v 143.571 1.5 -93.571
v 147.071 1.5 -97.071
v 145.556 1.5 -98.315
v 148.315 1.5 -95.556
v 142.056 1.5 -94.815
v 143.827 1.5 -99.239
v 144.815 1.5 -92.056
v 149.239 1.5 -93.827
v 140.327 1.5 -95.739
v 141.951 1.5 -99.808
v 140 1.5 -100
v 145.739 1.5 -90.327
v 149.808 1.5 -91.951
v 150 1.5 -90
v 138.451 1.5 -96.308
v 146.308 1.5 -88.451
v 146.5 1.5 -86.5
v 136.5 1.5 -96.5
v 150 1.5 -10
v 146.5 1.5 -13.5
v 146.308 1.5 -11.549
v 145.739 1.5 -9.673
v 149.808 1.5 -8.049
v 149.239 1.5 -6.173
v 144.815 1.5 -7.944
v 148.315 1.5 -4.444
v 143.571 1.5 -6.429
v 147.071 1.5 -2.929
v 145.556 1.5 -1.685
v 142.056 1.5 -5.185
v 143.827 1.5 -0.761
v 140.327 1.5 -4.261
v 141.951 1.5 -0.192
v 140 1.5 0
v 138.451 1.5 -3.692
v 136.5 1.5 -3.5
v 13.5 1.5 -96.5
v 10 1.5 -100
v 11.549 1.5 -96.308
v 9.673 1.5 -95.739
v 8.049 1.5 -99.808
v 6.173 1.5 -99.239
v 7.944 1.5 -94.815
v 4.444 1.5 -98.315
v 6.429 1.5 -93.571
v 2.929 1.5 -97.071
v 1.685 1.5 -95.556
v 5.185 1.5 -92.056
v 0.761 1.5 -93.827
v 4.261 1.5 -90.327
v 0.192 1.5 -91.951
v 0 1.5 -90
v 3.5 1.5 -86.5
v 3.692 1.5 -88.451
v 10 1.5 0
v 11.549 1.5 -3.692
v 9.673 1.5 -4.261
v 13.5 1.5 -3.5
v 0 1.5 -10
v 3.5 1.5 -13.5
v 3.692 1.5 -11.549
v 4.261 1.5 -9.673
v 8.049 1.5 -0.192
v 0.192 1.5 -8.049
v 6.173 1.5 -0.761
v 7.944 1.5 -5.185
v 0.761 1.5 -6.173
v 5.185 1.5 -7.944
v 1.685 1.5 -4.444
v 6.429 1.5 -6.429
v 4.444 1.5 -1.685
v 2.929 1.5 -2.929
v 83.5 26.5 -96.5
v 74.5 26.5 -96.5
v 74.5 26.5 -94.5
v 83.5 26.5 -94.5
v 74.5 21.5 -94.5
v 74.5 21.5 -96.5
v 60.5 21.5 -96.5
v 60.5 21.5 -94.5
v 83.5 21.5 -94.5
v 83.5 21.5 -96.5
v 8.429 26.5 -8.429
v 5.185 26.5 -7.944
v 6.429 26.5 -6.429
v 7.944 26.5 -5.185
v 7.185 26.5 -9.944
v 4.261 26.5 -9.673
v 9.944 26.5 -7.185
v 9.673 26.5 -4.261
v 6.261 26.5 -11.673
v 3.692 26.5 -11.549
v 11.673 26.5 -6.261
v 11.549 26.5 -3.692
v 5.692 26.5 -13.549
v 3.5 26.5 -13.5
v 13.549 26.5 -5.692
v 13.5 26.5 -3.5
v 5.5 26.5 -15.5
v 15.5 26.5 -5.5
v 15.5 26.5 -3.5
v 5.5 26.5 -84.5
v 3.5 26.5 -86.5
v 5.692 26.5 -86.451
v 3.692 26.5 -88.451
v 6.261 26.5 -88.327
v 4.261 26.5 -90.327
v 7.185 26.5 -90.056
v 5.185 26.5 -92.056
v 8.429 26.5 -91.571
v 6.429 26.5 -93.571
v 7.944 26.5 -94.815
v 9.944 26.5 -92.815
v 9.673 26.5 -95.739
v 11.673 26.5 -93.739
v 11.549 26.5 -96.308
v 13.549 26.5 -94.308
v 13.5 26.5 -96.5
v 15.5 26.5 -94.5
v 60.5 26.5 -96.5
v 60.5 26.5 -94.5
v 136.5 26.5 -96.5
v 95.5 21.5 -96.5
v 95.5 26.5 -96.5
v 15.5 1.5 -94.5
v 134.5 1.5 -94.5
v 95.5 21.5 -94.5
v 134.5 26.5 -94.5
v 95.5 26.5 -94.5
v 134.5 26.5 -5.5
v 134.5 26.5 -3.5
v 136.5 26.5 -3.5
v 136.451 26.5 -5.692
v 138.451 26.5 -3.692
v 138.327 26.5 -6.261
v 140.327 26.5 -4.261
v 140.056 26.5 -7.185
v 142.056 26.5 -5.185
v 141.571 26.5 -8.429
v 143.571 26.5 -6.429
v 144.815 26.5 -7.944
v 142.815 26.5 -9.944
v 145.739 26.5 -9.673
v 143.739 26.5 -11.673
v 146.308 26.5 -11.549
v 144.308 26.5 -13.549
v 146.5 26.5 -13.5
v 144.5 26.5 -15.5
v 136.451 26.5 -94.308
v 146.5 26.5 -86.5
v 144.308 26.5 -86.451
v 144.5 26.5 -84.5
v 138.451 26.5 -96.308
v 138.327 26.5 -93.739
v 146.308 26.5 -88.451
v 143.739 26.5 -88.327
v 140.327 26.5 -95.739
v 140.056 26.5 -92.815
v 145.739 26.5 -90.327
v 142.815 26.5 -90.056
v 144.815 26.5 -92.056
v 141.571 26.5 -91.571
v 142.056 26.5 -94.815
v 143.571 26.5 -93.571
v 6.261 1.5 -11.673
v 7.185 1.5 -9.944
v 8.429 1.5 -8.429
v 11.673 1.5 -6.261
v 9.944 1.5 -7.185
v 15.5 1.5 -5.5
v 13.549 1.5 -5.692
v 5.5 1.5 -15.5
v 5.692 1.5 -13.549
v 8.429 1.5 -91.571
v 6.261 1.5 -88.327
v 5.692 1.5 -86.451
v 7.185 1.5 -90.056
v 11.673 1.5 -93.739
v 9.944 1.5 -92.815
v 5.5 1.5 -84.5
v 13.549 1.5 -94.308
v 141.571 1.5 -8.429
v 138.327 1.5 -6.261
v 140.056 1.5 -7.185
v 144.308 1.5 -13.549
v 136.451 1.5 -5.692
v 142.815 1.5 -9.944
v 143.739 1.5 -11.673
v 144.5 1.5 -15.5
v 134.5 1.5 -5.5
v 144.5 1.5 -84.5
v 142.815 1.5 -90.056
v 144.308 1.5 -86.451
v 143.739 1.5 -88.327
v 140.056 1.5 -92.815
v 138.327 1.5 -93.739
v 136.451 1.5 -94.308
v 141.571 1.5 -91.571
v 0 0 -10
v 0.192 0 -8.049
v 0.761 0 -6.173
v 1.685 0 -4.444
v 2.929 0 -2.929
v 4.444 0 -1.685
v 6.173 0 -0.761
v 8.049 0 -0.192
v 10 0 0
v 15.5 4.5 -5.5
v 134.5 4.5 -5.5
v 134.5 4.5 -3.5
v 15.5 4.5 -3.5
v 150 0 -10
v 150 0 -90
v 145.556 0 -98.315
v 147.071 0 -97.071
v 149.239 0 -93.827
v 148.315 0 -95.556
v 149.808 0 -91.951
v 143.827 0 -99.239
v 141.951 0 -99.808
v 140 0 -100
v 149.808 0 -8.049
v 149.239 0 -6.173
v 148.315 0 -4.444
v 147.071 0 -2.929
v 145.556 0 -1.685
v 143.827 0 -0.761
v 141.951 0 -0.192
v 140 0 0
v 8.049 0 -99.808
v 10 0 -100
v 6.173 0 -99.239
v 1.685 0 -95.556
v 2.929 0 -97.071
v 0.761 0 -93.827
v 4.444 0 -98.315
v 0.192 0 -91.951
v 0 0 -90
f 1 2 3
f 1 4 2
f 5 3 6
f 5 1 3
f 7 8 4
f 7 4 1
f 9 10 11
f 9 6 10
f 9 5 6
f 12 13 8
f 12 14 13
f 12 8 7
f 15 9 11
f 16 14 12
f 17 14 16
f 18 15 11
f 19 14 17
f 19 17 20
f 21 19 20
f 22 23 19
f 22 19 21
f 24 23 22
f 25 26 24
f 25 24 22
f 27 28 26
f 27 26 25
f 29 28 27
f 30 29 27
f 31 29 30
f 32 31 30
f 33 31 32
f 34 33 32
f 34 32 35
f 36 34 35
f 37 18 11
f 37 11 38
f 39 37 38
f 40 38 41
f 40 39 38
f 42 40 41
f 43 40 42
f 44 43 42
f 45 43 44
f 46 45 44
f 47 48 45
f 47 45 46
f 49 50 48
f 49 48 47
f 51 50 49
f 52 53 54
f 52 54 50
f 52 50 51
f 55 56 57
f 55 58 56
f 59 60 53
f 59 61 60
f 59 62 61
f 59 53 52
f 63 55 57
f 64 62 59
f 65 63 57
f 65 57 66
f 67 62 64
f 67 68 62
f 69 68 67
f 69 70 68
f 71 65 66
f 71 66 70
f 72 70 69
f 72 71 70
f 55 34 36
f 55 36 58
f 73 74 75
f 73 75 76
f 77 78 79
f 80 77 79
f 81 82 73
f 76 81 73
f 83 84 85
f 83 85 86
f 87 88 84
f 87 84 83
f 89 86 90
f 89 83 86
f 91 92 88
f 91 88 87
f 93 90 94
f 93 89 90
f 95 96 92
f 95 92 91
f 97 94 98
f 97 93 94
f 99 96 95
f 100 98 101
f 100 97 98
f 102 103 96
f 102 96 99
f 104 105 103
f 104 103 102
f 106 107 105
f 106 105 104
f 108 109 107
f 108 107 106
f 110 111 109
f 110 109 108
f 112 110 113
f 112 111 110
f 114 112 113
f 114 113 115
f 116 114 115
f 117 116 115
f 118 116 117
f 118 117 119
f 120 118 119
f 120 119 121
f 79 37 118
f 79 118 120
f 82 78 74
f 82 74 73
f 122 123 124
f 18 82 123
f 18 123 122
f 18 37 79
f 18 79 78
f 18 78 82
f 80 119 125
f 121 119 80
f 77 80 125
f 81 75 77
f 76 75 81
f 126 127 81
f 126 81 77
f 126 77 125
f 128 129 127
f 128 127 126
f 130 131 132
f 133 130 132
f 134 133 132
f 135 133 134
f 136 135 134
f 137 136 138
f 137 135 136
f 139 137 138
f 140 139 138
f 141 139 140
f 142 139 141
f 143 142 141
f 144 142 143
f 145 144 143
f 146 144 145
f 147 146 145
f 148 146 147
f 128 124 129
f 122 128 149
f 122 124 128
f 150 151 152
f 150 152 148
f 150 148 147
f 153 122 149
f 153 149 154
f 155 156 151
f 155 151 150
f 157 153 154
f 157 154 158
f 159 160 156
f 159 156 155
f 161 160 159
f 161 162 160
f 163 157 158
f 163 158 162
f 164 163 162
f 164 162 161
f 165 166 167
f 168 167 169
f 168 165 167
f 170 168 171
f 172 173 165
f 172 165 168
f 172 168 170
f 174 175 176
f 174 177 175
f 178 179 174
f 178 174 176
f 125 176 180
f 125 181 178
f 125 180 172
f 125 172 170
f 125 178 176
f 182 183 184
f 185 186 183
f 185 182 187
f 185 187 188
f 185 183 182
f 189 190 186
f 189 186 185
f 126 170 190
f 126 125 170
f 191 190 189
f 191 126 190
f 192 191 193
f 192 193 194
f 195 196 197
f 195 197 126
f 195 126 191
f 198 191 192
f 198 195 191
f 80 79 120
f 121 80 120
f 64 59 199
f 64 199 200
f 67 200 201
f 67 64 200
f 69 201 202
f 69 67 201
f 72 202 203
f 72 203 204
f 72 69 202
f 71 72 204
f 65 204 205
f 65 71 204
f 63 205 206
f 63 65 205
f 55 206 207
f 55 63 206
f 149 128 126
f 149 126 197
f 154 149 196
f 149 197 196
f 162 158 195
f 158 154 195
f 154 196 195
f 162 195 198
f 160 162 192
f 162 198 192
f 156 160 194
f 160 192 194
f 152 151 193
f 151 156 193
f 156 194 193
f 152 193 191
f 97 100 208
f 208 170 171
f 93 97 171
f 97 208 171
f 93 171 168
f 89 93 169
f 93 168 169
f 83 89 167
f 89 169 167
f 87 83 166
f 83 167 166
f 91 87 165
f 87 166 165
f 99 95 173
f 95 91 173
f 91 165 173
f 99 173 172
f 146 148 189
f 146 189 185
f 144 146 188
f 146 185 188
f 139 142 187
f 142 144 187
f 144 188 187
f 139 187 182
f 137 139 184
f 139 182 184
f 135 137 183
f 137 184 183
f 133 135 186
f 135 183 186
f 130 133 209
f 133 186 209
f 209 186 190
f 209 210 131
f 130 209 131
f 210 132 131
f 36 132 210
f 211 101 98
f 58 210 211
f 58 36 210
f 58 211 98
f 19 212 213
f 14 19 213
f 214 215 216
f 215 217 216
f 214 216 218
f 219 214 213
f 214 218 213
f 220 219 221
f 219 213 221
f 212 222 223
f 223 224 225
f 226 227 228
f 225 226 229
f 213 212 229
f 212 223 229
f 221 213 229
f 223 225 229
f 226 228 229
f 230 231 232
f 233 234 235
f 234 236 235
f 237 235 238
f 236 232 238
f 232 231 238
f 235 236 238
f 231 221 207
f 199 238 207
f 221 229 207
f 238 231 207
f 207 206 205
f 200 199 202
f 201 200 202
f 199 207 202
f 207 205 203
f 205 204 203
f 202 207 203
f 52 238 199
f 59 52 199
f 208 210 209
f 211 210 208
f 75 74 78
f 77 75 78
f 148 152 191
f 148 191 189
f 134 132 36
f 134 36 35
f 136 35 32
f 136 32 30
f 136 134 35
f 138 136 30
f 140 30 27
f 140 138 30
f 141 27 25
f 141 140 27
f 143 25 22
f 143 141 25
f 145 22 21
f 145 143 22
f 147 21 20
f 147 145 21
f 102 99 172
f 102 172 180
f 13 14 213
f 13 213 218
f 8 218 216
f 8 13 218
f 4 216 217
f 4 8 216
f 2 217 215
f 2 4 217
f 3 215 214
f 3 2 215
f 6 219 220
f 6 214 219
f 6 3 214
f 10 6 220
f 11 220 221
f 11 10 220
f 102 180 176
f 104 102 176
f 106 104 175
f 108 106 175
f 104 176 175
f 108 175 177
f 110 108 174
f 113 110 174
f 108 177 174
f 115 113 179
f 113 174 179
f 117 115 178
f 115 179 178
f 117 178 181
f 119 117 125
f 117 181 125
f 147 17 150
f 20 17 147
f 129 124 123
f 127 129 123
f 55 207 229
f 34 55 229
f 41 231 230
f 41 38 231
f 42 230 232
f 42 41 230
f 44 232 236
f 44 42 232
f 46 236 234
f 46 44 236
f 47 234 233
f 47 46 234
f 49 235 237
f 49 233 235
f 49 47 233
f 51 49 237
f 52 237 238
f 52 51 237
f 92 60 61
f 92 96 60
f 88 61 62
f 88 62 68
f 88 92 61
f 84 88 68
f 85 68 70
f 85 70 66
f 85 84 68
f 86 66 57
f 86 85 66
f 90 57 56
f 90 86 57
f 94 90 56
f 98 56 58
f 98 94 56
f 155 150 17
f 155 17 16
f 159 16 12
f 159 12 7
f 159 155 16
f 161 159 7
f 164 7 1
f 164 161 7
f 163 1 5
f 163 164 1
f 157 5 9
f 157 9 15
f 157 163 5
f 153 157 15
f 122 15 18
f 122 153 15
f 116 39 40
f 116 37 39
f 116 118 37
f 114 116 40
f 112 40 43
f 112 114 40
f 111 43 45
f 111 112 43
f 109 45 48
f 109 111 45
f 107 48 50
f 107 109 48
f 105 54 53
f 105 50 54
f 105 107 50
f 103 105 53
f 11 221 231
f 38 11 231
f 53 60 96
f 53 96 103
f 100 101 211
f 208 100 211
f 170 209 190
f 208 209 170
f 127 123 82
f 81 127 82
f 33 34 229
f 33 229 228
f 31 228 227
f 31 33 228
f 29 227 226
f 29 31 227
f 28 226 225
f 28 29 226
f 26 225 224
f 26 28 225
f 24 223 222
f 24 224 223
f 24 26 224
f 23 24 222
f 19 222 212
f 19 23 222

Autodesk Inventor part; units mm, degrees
ref_plane "YZ Plane" through (0, 0, 0) normal (1, 0, 0) x (0, 1, 0)
ref_plane "XZ Plane" through (0, 0, 0) normal (0, 1, 0) x (-1, 0, 0)
ref_plane "XY Plane" through (0, 0, 0) normal (0, 0, 1) x (1, 0, 0)
sketch "Náčrt1" plane through (0, 0, 0) normal (0, 1, 0) x (-1, 0, 0)
  line L0 (0, 0) -> (-150, 0)
  line L1 (-150, 0) -> (-150, -100)
  line L2 (-150, -100) -> (0, -100)
  line L3 (0, -100) -> (0, 0)
  dimension "d0" = 150
  dimension "d1" = 100
extrude "Vysunutí1" add sketch "Náčrt1" along normal blind 1.5
fillet "Zaoblení1" radius 10 4 edges at (150, 0.75, -100) (150, 0.75, 0) (0, 0.75, 0) (0, 0.75, -100)
sketch "Náčrt3" plane through (0, 1.5, 0) normal (0, 1, 0) x (1, 0, 0)
  line L0 (3.5, 96.5) -> (146.5, 96.5)
  line L1 (146.5, 96.5) -> (146.5, 3.5)
  line L2 (146.5, 3.5) -> (3.5, 3.5)
  line L3 (3.5, 3.5) -> (3.5, 96.5)
  line L4 (0, 90) -> (0, 10) projected
  line L5 (10, 0) -> (140, 0) projected
  point P0 (0, 0)
  dimension "d11" = 3.5
  dimension "d12" = 3.5
  dimension "d13" = 93
  dimension "d14" = 143
extrude "Vysunutí3" add sketch "Náčrt3" along normal blind 25
sketch "Náčrt4" plane through (0, 26.5, 0) normal (0, 1, 0) x (1, 0, 0)
  line L0 (3.5, 96.5) -> (3.5, 3.5) projected
  line L1 (5.5, 94.5) -> (144.5, 94.5)
  line L2 (144.5, 94.5) -> (144.5, 5.5)
  line L3 (144.5, 5.5) -> (5.5, 5.5)
  line L4 (5.5, 5.5) -> (5.5, 94.5)
  line L5 (3.5, 3.5) -> (146.5, 3.5) projected
  point P0 (0, 0)
  point P1 (3.5, 13.5)
  point P2 (13.5, 3.5)
  point P3 (136.5, 3.5)
  dimension "d19" = 2
  dimension "d20" = 2
  dimension "d21" = 139
  dimension "d22" = 89
extrude "Vysunutí4" cut sketch "Náčrt4" against normal blind 25
fillet "Zaoblení3" radius 10 8 edges at (144.5, 14, -94.5) (5.5, 14, -94.5) (5.5, 14, -5.5) (144.5, 14, -5.5) (3.5, 14, -96.5) (3.5, 14, -3.5) (146.5, 14, -96.5) (146.5, 14, -3.5)
sketch "Náčrt5" plane through (13.5, 1.5, -3.5) normal (0, 0, 1) x (1, 0, 0)
  line L0 (121, 25) -> (2, 25) projected
  line L1 (133, 0) -> (133, 25) projected
  line L2 (-10, 25) -> (-10, 0) projected
  line L3 (121, 0) -> (121, 25) projected
  line L4 (2, 25) -> (2, 0) projected
  line L5 (121, 3) -> (2, 3)
  line L6 (2, 3) -> (2, 25)
  line L7 (2, 25) -> (121, 25)
  line L8 (121, 25) -> (121, 3)
  point P0 (-13.5, -1.5)
extrude "Vysunutí5" cut sketch "Náčrt5" against normal blind 2
sketch "Náčrt6" plane through (136.5, 1.5, -96.5) normal (0, 0, -1) x (-1, 0, 0)
  line L0 (121, 25) -> (2, 25) projected
  line L1 (76, 25) -> (62, 25)
  line L2 (62, 25) -> (62, 20)
  line L3 (62, 20) -> (76, 20)
  line L4 (76, 20) -> (76, 25)
  line L5 (53, 25) -> (41, 25)
  line L6 (41, 25) -> (41, 20)
  line L7 (41, 20) -> (53, 20)
  line L8 (53, 20) -> (53, 25)
  line L9 (123, 25) -> (123, 0) projected
  line L10 (0, 0) -> (0, 25) projected
  point P0 (136.5, -1.5)
  point P1 (41, 25)
  dimension "d30" = 47
  dimension "d31" = 61
  dimension "d32" = 41
  dimension "d33" = 53
  dimension "d34" = 5
extrude "Vysunutí6" cut sketch "Náčrt6" against normal blind 2
properties part number "víko"
